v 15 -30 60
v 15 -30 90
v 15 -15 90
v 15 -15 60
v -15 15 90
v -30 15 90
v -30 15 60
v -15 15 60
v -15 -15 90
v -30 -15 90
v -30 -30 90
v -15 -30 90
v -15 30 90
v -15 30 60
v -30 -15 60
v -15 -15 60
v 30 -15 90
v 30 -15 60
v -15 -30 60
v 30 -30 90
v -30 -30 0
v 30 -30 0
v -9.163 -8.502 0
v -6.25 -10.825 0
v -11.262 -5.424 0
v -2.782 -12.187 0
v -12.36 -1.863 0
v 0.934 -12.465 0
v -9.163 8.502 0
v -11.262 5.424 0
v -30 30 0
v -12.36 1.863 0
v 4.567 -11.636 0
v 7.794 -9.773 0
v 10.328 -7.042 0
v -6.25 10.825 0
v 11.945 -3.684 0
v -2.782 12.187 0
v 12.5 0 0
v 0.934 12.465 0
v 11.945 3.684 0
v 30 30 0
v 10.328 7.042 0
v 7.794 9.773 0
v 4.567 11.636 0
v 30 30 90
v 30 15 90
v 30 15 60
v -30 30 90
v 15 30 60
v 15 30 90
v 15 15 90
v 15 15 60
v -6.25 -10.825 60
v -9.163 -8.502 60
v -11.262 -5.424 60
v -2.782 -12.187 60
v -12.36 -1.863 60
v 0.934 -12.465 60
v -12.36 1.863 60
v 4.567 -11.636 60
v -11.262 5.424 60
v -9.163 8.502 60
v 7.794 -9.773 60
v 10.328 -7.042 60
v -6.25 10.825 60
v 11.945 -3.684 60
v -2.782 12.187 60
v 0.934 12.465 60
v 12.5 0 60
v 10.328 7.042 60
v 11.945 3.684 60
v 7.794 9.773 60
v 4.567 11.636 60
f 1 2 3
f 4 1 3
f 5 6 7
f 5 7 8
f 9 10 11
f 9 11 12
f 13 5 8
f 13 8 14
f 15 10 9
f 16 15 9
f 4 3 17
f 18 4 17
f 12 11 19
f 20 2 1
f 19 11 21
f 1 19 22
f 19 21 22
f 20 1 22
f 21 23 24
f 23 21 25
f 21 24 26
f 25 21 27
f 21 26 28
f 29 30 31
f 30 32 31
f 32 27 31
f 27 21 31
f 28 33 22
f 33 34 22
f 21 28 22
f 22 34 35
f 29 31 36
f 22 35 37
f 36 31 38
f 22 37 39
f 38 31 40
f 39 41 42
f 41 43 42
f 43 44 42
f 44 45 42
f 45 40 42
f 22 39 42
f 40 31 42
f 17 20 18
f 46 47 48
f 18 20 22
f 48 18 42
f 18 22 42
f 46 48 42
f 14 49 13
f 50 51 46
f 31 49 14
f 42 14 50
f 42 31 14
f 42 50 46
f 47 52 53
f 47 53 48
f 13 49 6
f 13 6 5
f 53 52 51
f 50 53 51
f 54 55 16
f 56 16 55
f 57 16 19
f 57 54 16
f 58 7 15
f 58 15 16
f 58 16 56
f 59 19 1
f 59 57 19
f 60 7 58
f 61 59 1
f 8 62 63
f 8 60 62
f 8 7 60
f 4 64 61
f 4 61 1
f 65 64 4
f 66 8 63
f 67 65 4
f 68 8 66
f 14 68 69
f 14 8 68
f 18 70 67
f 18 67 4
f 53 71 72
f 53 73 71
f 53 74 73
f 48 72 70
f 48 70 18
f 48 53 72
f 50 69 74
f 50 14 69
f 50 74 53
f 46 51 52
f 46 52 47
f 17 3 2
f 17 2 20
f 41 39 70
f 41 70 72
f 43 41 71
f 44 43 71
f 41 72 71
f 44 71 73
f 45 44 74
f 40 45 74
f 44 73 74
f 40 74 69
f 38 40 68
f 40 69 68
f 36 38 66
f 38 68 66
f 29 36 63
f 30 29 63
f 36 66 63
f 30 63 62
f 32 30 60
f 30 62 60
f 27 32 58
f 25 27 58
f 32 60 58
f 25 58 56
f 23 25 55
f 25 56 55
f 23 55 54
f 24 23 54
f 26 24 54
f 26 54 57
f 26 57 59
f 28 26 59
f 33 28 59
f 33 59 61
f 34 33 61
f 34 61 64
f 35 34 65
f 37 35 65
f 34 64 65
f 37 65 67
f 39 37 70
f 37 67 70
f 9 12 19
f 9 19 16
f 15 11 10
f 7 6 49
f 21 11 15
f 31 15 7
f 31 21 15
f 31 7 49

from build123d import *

# Parameters (mm, degrees)
F0_W     = 60
F0_H     = 60
F1_DEPTH = 60
F2_W     = 15
F2_H     = 15
F3_DEPTH = 30
F4_R     = 12.5
F5_DEPTH = 60


with BuildPart() as f1:
    # F0 (on Top) → F1 (new body)
    with BuildSketch(Plane.XY):
        Rectangle(F0_W, F0_H)
    extrude(amount=F1_DEPTH)

    # F2 (on face) → F3 (join)
    with BuildSketch(Plane.XY.offset(60)):
        with Locations((-22.5, -22.5)):
            Rectangle(F2_W, F2_H)
        with Locations((-22.5, 22.5)):
            Rectangle(F2_W, F2_H)
        with Locations((22.5, 22.5)):
            Rectangle(F2_W, F2_H)
        with Locations((22.5, -22.5)):
            Rectangle(F2_W, F2_H)
    extrude(amount=F3_DEPTH)

    # F4 (on face) → F5 (cut)
    with BuildSketch(Plane.XY.offset(60)):
        Circle(F4_R)
    extrude(amount=-F5_DEPTH, mode=Mode.SUBTRACT)


solid = f1.part
